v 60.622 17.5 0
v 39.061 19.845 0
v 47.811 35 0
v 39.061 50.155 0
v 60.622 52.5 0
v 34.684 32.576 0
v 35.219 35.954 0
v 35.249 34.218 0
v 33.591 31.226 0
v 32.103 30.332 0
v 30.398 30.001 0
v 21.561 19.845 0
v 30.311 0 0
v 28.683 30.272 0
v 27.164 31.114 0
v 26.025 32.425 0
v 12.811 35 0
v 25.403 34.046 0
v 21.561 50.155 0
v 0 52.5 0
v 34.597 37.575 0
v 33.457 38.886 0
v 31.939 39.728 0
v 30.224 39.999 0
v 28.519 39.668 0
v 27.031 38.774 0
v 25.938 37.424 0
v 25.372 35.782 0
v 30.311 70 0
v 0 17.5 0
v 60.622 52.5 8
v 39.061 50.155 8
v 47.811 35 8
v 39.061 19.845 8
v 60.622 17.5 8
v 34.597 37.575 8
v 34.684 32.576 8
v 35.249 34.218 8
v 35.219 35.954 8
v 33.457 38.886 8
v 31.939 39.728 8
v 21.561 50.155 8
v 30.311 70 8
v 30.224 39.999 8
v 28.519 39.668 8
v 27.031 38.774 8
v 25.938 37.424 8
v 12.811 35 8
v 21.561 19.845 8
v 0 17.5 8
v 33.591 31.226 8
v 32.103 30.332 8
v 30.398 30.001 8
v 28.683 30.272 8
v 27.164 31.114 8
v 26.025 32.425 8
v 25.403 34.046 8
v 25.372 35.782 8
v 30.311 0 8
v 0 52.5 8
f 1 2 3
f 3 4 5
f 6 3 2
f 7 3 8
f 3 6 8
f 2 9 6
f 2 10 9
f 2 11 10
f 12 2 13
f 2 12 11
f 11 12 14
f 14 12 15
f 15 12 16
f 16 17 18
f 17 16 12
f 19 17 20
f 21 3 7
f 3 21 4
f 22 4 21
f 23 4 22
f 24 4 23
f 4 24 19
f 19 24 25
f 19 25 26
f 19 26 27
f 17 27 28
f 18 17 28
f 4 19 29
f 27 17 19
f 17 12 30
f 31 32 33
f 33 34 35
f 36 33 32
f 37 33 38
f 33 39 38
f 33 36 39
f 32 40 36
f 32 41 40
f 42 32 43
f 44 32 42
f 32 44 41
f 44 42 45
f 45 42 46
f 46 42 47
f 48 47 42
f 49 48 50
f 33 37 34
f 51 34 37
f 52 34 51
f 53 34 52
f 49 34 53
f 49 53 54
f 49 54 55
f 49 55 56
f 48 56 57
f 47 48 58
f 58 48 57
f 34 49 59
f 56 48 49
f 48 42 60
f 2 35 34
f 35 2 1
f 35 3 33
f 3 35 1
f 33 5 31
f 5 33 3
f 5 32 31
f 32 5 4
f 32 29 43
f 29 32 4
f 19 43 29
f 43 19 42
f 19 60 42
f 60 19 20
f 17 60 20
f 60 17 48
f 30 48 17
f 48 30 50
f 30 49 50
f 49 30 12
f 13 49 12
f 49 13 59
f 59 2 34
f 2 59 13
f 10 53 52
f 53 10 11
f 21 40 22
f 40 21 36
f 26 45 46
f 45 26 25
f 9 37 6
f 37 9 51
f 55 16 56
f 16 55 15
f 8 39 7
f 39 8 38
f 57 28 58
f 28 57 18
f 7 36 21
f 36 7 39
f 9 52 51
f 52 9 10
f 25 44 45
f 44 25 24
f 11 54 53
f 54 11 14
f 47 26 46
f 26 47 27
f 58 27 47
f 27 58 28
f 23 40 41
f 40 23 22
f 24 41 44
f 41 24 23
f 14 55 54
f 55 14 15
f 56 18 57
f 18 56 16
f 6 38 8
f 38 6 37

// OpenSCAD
$fn = 32;

// ----------------------------------------------------------------------
// Star wheel: 6-point star, R35
// ----------------------------------------------------------------------

// --- parameters (mm) ---
n_points = 6;             // number of points / teeth
r_out = 35;               // tip radius
r_in = 17.5;              // root radius
bore_r = 5;               // centre bore radius
plate_t = 8;              // plate thickness, Z (extrusion height)
bore_d = 10;              // centre bore diameter

profile = [[30.311, 70], [21.561, 50.155], [0, 52.5], [12.811, 35], [0, 17.5], [21.561, 19.845], [30.311, 0], [39.061, 19.845], [60.622, 17.5], [47.811, 35], [60.622, 52.5], [39.061, 50.155]];  // primary outline, 12 points, counter clockwise
void_1 = [[35.219, 35.954], [34.597, 37.575], [33.457, 38.886], [31.939, 39.728], [30.224, 39.999], [28.519, 39.668], [27.031, 38.774], [25.938, 37.424], [25.372, 35.782], [25.403, 34.046], [26.025, 32.425], [27.164, 31.114], [28.683, 30.272], [30.398, 30.001], [32.103, 30.332], [33.591, 31.226], [34.684, 32.576], [35.249, 34.218]];  // centre bore, 18 points

// --- the one profile operation ---
difference() {
  linear_extrude(height = plate_t) polygon(points = profile);
  translate([0, 0, -1])
    linear_extrude(height = plate_t + 2) polygon(points = void_1);
}
